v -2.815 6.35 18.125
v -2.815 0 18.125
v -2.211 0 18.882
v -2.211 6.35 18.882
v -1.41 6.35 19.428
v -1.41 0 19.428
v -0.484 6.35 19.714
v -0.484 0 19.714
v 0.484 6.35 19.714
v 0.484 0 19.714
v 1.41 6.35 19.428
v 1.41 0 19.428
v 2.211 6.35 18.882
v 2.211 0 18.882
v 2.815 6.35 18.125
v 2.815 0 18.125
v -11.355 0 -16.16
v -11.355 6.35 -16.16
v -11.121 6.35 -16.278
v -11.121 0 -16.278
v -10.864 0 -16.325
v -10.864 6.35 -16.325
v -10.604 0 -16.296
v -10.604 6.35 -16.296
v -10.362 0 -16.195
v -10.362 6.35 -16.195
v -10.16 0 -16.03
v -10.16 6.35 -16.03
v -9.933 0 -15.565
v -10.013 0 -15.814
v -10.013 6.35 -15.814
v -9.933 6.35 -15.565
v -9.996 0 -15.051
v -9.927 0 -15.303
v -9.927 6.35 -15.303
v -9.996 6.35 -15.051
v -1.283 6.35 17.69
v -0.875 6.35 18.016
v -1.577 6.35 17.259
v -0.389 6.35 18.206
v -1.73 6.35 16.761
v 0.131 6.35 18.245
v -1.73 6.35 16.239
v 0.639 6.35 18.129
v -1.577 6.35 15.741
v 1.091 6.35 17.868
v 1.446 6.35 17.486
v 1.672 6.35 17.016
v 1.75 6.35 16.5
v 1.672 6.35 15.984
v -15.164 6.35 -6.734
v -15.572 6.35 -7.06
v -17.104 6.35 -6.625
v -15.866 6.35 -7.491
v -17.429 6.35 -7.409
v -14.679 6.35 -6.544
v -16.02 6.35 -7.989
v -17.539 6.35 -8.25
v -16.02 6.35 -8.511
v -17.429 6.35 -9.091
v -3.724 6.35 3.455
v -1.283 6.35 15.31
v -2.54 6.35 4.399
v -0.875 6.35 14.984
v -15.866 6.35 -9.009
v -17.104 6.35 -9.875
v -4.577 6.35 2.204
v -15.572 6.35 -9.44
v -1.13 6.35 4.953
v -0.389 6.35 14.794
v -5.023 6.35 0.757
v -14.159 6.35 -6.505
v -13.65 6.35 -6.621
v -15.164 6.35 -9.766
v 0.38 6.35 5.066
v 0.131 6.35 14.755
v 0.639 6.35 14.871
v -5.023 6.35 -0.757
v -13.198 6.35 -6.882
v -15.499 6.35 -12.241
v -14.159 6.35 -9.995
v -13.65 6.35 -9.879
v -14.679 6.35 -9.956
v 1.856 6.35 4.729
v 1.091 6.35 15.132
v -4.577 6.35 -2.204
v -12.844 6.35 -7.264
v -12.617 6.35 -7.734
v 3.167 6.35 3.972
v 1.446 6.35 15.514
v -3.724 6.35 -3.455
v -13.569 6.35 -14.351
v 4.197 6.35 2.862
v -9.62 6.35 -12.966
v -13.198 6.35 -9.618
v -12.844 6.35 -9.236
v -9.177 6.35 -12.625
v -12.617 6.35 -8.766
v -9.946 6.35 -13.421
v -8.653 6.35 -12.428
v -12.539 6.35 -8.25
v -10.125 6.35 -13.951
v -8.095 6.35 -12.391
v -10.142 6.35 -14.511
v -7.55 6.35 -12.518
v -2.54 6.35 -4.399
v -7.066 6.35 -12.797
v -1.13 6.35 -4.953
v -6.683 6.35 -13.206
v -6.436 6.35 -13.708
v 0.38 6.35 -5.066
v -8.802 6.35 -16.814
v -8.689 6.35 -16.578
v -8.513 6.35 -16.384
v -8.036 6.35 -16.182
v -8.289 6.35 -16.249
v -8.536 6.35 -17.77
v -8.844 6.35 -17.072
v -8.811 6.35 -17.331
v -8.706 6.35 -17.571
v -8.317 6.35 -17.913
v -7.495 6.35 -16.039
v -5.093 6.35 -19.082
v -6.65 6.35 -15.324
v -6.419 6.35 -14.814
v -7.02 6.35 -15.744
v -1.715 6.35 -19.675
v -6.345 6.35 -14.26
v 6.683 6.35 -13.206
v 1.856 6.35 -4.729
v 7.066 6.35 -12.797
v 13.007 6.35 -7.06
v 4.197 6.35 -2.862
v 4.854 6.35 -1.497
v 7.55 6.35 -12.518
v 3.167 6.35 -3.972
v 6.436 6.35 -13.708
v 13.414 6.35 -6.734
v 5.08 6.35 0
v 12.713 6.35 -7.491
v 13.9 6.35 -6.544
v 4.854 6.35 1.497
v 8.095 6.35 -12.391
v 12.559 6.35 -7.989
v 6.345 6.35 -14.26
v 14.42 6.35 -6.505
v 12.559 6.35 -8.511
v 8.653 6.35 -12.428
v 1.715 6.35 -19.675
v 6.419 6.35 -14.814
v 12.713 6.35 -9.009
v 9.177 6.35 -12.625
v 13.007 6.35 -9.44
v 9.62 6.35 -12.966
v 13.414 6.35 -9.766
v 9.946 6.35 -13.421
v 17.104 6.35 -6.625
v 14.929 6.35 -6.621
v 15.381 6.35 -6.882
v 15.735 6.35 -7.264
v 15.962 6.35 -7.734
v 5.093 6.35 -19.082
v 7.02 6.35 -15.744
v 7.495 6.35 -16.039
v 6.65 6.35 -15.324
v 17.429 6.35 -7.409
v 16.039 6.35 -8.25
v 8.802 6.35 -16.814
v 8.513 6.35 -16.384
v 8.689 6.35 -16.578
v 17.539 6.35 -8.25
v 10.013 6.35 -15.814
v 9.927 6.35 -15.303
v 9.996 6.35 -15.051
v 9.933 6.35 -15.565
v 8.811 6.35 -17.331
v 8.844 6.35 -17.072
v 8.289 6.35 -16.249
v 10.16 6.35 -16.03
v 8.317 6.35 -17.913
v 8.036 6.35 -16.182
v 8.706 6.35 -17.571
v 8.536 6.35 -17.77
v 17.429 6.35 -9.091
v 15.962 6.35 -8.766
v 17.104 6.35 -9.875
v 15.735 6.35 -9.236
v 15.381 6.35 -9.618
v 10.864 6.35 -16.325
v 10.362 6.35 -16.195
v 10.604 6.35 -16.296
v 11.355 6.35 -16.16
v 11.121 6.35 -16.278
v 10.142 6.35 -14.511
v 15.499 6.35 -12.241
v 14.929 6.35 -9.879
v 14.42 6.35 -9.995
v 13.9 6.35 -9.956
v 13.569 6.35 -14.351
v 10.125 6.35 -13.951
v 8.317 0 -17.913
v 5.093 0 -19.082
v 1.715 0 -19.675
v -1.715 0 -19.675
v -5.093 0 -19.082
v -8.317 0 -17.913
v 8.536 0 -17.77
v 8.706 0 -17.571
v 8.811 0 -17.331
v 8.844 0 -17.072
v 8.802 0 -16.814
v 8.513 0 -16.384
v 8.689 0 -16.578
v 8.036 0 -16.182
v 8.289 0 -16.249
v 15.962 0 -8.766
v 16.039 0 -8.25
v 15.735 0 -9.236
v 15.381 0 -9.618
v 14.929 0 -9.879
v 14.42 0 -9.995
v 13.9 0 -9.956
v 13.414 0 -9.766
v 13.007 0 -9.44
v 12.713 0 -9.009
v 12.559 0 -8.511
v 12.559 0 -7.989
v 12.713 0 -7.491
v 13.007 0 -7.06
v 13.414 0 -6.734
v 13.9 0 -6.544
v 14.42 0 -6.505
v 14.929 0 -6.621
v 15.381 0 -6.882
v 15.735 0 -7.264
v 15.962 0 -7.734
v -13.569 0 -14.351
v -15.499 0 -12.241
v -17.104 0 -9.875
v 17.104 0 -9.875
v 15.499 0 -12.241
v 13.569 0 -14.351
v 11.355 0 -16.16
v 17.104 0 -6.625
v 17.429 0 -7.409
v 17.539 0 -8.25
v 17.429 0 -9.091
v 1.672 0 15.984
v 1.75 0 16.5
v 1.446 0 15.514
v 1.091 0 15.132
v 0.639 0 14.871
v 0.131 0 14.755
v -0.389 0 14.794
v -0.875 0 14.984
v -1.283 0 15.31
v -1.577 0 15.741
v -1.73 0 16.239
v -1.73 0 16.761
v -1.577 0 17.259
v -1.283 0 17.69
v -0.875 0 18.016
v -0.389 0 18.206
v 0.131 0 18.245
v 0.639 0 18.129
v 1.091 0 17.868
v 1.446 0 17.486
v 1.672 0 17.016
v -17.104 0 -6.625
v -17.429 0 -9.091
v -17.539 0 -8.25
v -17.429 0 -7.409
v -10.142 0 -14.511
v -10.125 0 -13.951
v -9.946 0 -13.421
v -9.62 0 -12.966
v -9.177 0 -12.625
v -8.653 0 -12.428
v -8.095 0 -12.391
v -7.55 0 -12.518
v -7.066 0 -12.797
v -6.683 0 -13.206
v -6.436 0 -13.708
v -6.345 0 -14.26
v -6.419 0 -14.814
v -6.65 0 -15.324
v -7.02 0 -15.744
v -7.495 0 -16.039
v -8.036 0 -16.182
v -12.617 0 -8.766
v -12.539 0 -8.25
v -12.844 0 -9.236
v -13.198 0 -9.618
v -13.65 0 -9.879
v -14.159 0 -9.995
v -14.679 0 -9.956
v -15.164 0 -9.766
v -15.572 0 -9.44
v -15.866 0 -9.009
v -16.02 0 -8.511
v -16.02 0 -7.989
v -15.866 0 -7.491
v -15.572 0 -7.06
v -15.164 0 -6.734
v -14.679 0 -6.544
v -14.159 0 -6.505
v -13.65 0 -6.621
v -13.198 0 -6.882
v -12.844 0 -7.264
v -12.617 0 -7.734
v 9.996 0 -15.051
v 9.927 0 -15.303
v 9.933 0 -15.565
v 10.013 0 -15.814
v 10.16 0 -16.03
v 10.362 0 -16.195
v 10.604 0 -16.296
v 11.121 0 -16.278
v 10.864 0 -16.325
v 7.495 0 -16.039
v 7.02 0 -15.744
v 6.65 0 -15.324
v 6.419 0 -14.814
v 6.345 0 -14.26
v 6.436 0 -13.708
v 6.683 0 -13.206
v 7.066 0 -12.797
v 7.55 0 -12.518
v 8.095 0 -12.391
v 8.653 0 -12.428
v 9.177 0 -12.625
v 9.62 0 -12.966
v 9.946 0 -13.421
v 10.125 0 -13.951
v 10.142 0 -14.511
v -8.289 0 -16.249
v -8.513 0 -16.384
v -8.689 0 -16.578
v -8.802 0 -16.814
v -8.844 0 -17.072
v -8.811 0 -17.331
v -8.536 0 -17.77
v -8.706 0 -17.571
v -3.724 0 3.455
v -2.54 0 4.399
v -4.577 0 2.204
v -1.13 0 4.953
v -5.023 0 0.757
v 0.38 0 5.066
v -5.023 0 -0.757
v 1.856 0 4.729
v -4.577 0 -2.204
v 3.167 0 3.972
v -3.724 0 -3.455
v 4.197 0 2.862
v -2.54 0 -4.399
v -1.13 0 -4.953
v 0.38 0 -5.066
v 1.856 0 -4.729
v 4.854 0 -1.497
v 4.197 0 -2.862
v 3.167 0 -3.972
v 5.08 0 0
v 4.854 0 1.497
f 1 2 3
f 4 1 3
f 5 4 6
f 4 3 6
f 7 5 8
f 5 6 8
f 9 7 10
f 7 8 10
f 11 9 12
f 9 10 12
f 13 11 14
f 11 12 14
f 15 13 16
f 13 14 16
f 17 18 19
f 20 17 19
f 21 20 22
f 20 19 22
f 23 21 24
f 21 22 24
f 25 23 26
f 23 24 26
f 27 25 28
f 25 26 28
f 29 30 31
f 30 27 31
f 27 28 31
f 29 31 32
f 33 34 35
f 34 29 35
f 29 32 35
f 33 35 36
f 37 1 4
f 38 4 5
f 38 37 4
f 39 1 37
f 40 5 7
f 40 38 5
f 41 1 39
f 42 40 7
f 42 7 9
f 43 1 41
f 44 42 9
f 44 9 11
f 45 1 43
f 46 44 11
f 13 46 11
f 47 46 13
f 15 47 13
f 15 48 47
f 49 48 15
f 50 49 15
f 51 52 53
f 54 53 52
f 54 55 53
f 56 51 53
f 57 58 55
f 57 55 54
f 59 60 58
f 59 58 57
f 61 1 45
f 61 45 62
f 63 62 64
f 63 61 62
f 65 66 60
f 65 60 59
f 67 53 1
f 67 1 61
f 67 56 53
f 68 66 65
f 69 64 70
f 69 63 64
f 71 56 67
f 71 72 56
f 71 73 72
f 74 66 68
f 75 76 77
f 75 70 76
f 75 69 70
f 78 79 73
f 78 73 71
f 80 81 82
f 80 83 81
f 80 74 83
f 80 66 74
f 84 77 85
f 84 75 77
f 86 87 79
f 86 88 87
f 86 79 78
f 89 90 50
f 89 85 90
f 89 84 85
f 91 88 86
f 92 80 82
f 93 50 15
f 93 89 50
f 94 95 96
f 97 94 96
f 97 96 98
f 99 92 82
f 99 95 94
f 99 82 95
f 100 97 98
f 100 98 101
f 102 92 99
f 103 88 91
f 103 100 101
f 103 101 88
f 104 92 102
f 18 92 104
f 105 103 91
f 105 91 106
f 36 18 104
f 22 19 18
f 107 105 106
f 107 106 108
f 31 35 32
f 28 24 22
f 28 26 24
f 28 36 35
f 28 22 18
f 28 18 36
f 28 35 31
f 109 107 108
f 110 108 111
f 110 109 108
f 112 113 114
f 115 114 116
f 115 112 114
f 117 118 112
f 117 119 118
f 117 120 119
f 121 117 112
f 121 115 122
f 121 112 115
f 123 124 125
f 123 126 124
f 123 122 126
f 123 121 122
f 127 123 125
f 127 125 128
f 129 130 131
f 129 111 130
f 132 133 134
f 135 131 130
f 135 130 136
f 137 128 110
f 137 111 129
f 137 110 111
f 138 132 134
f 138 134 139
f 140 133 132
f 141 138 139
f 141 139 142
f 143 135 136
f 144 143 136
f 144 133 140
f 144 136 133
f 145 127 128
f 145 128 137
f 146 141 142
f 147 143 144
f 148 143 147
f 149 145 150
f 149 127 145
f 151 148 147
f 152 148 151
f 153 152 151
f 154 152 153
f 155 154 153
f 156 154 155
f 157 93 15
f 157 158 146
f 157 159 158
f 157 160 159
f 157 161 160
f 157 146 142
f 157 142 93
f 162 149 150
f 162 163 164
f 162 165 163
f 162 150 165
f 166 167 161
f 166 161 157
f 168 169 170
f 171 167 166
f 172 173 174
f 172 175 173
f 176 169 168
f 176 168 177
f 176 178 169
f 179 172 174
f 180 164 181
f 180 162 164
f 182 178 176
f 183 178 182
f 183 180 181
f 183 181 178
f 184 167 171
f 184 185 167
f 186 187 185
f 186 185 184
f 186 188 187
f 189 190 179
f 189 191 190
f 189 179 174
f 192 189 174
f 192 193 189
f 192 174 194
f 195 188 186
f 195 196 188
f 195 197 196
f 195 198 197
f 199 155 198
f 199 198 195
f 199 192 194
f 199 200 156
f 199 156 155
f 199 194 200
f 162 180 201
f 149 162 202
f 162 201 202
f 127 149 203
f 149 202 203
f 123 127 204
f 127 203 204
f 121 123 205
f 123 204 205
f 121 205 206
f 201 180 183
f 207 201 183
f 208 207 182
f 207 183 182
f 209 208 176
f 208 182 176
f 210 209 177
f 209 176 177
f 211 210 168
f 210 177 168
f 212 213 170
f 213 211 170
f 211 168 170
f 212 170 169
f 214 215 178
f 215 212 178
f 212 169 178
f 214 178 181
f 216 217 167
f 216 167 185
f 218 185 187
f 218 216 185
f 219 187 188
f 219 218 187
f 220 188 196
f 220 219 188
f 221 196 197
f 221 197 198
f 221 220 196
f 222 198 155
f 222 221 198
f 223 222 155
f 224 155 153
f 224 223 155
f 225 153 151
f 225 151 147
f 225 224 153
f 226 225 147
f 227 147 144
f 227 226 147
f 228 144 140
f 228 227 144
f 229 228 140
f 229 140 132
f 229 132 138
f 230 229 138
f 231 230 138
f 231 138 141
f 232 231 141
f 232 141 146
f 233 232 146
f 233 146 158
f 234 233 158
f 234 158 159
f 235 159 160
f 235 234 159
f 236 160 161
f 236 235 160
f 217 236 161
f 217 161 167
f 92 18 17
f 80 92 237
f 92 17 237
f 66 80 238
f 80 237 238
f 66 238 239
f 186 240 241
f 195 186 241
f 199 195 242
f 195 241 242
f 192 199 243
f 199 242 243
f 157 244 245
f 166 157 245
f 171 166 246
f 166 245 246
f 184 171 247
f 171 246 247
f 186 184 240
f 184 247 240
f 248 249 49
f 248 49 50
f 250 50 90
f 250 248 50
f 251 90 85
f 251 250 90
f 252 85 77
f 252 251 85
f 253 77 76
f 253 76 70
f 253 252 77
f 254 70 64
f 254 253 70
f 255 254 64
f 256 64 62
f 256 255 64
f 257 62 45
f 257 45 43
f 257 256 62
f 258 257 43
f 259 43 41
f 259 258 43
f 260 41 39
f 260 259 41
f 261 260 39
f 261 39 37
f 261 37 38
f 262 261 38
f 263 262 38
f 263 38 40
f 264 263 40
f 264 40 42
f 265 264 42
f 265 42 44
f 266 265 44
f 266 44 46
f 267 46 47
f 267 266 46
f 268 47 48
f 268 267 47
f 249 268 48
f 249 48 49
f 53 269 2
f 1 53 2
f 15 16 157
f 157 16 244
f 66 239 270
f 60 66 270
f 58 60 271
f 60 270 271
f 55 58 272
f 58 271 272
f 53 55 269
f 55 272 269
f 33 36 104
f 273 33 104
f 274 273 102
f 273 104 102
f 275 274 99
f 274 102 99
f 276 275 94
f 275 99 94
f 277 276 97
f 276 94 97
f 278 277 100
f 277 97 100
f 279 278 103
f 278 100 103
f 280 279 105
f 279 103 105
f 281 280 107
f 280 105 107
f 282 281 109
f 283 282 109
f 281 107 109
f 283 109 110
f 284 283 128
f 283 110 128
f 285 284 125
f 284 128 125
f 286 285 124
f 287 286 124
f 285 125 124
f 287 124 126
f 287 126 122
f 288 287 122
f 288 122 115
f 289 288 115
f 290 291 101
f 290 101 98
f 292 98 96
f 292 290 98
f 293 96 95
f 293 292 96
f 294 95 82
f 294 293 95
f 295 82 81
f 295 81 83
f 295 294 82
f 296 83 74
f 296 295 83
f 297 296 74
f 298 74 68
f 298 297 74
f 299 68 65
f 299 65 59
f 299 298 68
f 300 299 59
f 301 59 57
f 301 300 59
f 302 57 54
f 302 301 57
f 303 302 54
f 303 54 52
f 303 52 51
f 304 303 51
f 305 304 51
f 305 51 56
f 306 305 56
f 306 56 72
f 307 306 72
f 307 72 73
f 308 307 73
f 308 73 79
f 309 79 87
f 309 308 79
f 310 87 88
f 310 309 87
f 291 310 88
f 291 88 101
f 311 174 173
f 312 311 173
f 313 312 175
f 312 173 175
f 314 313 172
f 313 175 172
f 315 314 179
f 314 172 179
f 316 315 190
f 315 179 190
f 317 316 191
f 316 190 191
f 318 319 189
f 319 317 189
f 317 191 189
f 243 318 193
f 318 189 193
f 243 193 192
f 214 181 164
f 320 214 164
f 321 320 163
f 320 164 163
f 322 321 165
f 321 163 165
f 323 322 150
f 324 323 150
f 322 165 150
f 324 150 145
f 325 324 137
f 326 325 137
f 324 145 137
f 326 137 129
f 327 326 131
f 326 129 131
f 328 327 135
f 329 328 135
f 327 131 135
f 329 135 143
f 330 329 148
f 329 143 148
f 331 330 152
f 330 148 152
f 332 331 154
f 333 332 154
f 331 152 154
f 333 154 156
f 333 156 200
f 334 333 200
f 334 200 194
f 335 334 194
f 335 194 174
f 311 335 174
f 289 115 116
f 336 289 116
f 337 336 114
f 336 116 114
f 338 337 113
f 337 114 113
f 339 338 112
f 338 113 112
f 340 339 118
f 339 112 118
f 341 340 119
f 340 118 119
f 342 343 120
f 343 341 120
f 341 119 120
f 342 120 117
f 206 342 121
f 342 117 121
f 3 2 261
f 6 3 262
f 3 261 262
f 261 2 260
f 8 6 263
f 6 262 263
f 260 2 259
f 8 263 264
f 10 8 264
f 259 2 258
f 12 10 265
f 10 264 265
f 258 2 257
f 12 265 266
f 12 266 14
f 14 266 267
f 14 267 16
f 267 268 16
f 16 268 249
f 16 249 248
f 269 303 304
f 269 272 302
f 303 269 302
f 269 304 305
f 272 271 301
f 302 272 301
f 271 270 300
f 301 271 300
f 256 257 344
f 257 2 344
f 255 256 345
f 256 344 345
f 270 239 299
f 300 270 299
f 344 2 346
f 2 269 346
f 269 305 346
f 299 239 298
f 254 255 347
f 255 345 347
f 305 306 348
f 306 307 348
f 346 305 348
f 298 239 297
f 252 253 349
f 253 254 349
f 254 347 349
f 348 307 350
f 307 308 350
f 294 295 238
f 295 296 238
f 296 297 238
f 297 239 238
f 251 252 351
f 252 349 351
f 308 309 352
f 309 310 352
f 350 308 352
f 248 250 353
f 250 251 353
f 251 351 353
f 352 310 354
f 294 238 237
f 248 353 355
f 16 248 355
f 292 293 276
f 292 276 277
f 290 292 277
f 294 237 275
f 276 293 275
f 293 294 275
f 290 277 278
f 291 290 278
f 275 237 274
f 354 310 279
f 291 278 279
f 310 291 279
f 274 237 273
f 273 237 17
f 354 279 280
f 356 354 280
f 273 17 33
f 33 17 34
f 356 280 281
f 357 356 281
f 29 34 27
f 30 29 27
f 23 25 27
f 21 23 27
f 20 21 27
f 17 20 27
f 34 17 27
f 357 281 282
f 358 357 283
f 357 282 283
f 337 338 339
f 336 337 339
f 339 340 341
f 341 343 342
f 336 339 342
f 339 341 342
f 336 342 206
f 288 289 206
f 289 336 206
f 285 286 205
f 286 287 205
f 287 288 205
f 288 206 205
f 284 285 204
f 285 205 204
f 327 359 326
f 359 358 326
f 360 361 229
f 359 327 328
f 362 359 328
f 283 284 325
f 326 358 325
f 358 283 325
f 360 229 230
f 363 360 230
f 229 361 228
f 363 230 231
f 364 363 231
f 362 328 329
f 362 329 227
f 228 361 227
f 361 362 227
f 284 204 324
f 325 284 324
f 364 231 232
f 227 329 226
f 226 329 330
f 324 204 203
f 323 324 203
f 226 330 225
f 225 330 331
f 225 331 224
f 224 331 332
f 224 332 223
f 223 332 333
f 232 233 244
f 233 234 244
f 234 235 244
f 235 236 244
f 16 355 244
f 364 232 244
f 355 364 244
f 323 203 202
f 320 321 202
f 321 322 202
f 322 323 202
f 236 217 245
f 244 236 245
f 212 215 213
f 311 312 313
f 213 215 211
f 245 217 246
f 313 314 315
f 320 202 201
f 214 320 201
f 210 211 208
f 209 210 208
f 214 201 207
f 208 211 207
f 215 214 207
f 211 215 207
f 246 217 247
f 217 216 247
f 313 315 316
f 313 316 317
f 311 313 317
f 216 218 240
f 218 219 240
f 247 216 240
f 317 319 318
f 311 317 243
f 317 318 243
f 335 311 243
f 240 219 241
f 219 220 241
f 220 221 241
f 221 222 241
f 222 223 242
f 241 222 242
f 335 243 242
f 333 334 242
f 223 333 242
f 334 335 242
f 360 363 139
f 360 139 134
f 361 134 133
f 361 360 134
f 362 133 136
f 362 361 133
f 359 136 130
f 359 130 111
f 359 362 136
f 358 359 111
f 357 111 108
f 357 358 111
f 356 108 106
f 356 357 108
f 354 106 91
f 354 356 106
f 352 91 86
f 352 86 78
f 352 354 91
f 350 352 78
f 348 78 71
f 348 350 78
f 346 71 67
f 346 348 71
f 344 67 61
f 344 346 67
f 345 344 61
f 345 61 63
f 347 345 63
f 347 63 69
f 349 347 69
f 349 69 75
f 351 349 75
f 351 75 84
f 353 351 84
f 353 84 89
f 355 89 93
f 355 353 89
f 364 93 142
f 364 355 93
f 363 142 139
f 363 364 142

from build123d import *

# Parameters (mm, degrees)
SKETCH1_R           = 5.08
SKETCH1_R_2         = 1.75
BOSS_EXTRUDE1_DEPTH = 6.35
CUT_EXTRUDE1_DEPTH  = 7.35
CIRPATTERN1_COUNT   = 2
CIRPATTERN1_ANGLE   = 60


with BuildPart() as part:
    # Sketch1 → Boss-Extrude1 (new body)
    with BuildSketch(Plane(origin=(0, 0, 0), x_dir=(1, 0, 0), z_dir=(0, 1, 0))):
        with BuildLine():
            Line((-17.104001725, 6.625), (-2.814582562, -18.125))
            ThreePointArc((-2.814582562, -18.125), (0, -19.75), (2.814582562, -18.125))
            Line((2.814582562, -18.125), (17.104001725, 6.625))
            ThreePointArc((17.104001725, 6.625), (17.539419162, 8.25), (17.104001725, 9.875))
            ThreePointArc((17.104001725, 9.875), (0, 19.75), (-17.104001725, 9.875))
            ThreePointArc((-17.104001725, 9.875), (-17.539419162, 8.25), (-17.104001725, 6.625))
        make_face()
        Circle(SKETCH1_R, mode=Mode.SUBTRACT)
        with Locations((-14.289419162, 8.25)):
            Circle(SKETCH1_R_2, mode=Mode.SUBTRACT)
        with Locations((0, -16.5)):
            Circle(SKETCH1_R_2, mode=Mode.SUBTRACT)
        with Locations((14.289419162, 8.25)):
            Circle(SKETCH1_R_2, mode=Mode.SUBTRACT)
    extrude(amount=BOSS_EXTRUDE1_DEPTH)

    # Sketch2 → Cut-Extrude1 (cut, through all)
    with BuildSketch(Plane(origin=(0, 6.35, 0), x_dir=(1, 0, 0), z_dir=(0, 1, 0))):
        with BuildLine():
            ThreePointArc((8.036161973, 16.182379357), (7.2975, 12.639640768), (9.99627063, 15.050710096))
            ThreePointArc((9.99627063, 15.050710096), (10.255103275, 16.120005739), (11.354562521, 16.159715652))
            ThreePointArc((11.354562521, 16.159715652), (9.875, 17.104001725), (8.317443012, 17.913197418))
            ThreePointArc((8.317443012, 17.913197418), (8.832782842, 16.941182824), (8.036161973, 16.182379357))
        make_face()
    cut_extrude1 = extrude(amount=-CUT_EXTRUDE1_DEPTH, mode=Mode.SUBTRACT)

    # CirPattern1: Cut-Extrude1 ×2 about axis
    cirpattern1_axis = Axis((0, 0, 0), (0, 1, 0))
    for i in range(1, CIRPATTERN1_COUNT):
        add(cut_extrude1.rotate(cirpattern1_axis, i * CIRPATTERN1_ANGLE / (CIRPATTERN1_COUNT - 1)), mode=Mode.SUBTRACT)


solid = part.part
